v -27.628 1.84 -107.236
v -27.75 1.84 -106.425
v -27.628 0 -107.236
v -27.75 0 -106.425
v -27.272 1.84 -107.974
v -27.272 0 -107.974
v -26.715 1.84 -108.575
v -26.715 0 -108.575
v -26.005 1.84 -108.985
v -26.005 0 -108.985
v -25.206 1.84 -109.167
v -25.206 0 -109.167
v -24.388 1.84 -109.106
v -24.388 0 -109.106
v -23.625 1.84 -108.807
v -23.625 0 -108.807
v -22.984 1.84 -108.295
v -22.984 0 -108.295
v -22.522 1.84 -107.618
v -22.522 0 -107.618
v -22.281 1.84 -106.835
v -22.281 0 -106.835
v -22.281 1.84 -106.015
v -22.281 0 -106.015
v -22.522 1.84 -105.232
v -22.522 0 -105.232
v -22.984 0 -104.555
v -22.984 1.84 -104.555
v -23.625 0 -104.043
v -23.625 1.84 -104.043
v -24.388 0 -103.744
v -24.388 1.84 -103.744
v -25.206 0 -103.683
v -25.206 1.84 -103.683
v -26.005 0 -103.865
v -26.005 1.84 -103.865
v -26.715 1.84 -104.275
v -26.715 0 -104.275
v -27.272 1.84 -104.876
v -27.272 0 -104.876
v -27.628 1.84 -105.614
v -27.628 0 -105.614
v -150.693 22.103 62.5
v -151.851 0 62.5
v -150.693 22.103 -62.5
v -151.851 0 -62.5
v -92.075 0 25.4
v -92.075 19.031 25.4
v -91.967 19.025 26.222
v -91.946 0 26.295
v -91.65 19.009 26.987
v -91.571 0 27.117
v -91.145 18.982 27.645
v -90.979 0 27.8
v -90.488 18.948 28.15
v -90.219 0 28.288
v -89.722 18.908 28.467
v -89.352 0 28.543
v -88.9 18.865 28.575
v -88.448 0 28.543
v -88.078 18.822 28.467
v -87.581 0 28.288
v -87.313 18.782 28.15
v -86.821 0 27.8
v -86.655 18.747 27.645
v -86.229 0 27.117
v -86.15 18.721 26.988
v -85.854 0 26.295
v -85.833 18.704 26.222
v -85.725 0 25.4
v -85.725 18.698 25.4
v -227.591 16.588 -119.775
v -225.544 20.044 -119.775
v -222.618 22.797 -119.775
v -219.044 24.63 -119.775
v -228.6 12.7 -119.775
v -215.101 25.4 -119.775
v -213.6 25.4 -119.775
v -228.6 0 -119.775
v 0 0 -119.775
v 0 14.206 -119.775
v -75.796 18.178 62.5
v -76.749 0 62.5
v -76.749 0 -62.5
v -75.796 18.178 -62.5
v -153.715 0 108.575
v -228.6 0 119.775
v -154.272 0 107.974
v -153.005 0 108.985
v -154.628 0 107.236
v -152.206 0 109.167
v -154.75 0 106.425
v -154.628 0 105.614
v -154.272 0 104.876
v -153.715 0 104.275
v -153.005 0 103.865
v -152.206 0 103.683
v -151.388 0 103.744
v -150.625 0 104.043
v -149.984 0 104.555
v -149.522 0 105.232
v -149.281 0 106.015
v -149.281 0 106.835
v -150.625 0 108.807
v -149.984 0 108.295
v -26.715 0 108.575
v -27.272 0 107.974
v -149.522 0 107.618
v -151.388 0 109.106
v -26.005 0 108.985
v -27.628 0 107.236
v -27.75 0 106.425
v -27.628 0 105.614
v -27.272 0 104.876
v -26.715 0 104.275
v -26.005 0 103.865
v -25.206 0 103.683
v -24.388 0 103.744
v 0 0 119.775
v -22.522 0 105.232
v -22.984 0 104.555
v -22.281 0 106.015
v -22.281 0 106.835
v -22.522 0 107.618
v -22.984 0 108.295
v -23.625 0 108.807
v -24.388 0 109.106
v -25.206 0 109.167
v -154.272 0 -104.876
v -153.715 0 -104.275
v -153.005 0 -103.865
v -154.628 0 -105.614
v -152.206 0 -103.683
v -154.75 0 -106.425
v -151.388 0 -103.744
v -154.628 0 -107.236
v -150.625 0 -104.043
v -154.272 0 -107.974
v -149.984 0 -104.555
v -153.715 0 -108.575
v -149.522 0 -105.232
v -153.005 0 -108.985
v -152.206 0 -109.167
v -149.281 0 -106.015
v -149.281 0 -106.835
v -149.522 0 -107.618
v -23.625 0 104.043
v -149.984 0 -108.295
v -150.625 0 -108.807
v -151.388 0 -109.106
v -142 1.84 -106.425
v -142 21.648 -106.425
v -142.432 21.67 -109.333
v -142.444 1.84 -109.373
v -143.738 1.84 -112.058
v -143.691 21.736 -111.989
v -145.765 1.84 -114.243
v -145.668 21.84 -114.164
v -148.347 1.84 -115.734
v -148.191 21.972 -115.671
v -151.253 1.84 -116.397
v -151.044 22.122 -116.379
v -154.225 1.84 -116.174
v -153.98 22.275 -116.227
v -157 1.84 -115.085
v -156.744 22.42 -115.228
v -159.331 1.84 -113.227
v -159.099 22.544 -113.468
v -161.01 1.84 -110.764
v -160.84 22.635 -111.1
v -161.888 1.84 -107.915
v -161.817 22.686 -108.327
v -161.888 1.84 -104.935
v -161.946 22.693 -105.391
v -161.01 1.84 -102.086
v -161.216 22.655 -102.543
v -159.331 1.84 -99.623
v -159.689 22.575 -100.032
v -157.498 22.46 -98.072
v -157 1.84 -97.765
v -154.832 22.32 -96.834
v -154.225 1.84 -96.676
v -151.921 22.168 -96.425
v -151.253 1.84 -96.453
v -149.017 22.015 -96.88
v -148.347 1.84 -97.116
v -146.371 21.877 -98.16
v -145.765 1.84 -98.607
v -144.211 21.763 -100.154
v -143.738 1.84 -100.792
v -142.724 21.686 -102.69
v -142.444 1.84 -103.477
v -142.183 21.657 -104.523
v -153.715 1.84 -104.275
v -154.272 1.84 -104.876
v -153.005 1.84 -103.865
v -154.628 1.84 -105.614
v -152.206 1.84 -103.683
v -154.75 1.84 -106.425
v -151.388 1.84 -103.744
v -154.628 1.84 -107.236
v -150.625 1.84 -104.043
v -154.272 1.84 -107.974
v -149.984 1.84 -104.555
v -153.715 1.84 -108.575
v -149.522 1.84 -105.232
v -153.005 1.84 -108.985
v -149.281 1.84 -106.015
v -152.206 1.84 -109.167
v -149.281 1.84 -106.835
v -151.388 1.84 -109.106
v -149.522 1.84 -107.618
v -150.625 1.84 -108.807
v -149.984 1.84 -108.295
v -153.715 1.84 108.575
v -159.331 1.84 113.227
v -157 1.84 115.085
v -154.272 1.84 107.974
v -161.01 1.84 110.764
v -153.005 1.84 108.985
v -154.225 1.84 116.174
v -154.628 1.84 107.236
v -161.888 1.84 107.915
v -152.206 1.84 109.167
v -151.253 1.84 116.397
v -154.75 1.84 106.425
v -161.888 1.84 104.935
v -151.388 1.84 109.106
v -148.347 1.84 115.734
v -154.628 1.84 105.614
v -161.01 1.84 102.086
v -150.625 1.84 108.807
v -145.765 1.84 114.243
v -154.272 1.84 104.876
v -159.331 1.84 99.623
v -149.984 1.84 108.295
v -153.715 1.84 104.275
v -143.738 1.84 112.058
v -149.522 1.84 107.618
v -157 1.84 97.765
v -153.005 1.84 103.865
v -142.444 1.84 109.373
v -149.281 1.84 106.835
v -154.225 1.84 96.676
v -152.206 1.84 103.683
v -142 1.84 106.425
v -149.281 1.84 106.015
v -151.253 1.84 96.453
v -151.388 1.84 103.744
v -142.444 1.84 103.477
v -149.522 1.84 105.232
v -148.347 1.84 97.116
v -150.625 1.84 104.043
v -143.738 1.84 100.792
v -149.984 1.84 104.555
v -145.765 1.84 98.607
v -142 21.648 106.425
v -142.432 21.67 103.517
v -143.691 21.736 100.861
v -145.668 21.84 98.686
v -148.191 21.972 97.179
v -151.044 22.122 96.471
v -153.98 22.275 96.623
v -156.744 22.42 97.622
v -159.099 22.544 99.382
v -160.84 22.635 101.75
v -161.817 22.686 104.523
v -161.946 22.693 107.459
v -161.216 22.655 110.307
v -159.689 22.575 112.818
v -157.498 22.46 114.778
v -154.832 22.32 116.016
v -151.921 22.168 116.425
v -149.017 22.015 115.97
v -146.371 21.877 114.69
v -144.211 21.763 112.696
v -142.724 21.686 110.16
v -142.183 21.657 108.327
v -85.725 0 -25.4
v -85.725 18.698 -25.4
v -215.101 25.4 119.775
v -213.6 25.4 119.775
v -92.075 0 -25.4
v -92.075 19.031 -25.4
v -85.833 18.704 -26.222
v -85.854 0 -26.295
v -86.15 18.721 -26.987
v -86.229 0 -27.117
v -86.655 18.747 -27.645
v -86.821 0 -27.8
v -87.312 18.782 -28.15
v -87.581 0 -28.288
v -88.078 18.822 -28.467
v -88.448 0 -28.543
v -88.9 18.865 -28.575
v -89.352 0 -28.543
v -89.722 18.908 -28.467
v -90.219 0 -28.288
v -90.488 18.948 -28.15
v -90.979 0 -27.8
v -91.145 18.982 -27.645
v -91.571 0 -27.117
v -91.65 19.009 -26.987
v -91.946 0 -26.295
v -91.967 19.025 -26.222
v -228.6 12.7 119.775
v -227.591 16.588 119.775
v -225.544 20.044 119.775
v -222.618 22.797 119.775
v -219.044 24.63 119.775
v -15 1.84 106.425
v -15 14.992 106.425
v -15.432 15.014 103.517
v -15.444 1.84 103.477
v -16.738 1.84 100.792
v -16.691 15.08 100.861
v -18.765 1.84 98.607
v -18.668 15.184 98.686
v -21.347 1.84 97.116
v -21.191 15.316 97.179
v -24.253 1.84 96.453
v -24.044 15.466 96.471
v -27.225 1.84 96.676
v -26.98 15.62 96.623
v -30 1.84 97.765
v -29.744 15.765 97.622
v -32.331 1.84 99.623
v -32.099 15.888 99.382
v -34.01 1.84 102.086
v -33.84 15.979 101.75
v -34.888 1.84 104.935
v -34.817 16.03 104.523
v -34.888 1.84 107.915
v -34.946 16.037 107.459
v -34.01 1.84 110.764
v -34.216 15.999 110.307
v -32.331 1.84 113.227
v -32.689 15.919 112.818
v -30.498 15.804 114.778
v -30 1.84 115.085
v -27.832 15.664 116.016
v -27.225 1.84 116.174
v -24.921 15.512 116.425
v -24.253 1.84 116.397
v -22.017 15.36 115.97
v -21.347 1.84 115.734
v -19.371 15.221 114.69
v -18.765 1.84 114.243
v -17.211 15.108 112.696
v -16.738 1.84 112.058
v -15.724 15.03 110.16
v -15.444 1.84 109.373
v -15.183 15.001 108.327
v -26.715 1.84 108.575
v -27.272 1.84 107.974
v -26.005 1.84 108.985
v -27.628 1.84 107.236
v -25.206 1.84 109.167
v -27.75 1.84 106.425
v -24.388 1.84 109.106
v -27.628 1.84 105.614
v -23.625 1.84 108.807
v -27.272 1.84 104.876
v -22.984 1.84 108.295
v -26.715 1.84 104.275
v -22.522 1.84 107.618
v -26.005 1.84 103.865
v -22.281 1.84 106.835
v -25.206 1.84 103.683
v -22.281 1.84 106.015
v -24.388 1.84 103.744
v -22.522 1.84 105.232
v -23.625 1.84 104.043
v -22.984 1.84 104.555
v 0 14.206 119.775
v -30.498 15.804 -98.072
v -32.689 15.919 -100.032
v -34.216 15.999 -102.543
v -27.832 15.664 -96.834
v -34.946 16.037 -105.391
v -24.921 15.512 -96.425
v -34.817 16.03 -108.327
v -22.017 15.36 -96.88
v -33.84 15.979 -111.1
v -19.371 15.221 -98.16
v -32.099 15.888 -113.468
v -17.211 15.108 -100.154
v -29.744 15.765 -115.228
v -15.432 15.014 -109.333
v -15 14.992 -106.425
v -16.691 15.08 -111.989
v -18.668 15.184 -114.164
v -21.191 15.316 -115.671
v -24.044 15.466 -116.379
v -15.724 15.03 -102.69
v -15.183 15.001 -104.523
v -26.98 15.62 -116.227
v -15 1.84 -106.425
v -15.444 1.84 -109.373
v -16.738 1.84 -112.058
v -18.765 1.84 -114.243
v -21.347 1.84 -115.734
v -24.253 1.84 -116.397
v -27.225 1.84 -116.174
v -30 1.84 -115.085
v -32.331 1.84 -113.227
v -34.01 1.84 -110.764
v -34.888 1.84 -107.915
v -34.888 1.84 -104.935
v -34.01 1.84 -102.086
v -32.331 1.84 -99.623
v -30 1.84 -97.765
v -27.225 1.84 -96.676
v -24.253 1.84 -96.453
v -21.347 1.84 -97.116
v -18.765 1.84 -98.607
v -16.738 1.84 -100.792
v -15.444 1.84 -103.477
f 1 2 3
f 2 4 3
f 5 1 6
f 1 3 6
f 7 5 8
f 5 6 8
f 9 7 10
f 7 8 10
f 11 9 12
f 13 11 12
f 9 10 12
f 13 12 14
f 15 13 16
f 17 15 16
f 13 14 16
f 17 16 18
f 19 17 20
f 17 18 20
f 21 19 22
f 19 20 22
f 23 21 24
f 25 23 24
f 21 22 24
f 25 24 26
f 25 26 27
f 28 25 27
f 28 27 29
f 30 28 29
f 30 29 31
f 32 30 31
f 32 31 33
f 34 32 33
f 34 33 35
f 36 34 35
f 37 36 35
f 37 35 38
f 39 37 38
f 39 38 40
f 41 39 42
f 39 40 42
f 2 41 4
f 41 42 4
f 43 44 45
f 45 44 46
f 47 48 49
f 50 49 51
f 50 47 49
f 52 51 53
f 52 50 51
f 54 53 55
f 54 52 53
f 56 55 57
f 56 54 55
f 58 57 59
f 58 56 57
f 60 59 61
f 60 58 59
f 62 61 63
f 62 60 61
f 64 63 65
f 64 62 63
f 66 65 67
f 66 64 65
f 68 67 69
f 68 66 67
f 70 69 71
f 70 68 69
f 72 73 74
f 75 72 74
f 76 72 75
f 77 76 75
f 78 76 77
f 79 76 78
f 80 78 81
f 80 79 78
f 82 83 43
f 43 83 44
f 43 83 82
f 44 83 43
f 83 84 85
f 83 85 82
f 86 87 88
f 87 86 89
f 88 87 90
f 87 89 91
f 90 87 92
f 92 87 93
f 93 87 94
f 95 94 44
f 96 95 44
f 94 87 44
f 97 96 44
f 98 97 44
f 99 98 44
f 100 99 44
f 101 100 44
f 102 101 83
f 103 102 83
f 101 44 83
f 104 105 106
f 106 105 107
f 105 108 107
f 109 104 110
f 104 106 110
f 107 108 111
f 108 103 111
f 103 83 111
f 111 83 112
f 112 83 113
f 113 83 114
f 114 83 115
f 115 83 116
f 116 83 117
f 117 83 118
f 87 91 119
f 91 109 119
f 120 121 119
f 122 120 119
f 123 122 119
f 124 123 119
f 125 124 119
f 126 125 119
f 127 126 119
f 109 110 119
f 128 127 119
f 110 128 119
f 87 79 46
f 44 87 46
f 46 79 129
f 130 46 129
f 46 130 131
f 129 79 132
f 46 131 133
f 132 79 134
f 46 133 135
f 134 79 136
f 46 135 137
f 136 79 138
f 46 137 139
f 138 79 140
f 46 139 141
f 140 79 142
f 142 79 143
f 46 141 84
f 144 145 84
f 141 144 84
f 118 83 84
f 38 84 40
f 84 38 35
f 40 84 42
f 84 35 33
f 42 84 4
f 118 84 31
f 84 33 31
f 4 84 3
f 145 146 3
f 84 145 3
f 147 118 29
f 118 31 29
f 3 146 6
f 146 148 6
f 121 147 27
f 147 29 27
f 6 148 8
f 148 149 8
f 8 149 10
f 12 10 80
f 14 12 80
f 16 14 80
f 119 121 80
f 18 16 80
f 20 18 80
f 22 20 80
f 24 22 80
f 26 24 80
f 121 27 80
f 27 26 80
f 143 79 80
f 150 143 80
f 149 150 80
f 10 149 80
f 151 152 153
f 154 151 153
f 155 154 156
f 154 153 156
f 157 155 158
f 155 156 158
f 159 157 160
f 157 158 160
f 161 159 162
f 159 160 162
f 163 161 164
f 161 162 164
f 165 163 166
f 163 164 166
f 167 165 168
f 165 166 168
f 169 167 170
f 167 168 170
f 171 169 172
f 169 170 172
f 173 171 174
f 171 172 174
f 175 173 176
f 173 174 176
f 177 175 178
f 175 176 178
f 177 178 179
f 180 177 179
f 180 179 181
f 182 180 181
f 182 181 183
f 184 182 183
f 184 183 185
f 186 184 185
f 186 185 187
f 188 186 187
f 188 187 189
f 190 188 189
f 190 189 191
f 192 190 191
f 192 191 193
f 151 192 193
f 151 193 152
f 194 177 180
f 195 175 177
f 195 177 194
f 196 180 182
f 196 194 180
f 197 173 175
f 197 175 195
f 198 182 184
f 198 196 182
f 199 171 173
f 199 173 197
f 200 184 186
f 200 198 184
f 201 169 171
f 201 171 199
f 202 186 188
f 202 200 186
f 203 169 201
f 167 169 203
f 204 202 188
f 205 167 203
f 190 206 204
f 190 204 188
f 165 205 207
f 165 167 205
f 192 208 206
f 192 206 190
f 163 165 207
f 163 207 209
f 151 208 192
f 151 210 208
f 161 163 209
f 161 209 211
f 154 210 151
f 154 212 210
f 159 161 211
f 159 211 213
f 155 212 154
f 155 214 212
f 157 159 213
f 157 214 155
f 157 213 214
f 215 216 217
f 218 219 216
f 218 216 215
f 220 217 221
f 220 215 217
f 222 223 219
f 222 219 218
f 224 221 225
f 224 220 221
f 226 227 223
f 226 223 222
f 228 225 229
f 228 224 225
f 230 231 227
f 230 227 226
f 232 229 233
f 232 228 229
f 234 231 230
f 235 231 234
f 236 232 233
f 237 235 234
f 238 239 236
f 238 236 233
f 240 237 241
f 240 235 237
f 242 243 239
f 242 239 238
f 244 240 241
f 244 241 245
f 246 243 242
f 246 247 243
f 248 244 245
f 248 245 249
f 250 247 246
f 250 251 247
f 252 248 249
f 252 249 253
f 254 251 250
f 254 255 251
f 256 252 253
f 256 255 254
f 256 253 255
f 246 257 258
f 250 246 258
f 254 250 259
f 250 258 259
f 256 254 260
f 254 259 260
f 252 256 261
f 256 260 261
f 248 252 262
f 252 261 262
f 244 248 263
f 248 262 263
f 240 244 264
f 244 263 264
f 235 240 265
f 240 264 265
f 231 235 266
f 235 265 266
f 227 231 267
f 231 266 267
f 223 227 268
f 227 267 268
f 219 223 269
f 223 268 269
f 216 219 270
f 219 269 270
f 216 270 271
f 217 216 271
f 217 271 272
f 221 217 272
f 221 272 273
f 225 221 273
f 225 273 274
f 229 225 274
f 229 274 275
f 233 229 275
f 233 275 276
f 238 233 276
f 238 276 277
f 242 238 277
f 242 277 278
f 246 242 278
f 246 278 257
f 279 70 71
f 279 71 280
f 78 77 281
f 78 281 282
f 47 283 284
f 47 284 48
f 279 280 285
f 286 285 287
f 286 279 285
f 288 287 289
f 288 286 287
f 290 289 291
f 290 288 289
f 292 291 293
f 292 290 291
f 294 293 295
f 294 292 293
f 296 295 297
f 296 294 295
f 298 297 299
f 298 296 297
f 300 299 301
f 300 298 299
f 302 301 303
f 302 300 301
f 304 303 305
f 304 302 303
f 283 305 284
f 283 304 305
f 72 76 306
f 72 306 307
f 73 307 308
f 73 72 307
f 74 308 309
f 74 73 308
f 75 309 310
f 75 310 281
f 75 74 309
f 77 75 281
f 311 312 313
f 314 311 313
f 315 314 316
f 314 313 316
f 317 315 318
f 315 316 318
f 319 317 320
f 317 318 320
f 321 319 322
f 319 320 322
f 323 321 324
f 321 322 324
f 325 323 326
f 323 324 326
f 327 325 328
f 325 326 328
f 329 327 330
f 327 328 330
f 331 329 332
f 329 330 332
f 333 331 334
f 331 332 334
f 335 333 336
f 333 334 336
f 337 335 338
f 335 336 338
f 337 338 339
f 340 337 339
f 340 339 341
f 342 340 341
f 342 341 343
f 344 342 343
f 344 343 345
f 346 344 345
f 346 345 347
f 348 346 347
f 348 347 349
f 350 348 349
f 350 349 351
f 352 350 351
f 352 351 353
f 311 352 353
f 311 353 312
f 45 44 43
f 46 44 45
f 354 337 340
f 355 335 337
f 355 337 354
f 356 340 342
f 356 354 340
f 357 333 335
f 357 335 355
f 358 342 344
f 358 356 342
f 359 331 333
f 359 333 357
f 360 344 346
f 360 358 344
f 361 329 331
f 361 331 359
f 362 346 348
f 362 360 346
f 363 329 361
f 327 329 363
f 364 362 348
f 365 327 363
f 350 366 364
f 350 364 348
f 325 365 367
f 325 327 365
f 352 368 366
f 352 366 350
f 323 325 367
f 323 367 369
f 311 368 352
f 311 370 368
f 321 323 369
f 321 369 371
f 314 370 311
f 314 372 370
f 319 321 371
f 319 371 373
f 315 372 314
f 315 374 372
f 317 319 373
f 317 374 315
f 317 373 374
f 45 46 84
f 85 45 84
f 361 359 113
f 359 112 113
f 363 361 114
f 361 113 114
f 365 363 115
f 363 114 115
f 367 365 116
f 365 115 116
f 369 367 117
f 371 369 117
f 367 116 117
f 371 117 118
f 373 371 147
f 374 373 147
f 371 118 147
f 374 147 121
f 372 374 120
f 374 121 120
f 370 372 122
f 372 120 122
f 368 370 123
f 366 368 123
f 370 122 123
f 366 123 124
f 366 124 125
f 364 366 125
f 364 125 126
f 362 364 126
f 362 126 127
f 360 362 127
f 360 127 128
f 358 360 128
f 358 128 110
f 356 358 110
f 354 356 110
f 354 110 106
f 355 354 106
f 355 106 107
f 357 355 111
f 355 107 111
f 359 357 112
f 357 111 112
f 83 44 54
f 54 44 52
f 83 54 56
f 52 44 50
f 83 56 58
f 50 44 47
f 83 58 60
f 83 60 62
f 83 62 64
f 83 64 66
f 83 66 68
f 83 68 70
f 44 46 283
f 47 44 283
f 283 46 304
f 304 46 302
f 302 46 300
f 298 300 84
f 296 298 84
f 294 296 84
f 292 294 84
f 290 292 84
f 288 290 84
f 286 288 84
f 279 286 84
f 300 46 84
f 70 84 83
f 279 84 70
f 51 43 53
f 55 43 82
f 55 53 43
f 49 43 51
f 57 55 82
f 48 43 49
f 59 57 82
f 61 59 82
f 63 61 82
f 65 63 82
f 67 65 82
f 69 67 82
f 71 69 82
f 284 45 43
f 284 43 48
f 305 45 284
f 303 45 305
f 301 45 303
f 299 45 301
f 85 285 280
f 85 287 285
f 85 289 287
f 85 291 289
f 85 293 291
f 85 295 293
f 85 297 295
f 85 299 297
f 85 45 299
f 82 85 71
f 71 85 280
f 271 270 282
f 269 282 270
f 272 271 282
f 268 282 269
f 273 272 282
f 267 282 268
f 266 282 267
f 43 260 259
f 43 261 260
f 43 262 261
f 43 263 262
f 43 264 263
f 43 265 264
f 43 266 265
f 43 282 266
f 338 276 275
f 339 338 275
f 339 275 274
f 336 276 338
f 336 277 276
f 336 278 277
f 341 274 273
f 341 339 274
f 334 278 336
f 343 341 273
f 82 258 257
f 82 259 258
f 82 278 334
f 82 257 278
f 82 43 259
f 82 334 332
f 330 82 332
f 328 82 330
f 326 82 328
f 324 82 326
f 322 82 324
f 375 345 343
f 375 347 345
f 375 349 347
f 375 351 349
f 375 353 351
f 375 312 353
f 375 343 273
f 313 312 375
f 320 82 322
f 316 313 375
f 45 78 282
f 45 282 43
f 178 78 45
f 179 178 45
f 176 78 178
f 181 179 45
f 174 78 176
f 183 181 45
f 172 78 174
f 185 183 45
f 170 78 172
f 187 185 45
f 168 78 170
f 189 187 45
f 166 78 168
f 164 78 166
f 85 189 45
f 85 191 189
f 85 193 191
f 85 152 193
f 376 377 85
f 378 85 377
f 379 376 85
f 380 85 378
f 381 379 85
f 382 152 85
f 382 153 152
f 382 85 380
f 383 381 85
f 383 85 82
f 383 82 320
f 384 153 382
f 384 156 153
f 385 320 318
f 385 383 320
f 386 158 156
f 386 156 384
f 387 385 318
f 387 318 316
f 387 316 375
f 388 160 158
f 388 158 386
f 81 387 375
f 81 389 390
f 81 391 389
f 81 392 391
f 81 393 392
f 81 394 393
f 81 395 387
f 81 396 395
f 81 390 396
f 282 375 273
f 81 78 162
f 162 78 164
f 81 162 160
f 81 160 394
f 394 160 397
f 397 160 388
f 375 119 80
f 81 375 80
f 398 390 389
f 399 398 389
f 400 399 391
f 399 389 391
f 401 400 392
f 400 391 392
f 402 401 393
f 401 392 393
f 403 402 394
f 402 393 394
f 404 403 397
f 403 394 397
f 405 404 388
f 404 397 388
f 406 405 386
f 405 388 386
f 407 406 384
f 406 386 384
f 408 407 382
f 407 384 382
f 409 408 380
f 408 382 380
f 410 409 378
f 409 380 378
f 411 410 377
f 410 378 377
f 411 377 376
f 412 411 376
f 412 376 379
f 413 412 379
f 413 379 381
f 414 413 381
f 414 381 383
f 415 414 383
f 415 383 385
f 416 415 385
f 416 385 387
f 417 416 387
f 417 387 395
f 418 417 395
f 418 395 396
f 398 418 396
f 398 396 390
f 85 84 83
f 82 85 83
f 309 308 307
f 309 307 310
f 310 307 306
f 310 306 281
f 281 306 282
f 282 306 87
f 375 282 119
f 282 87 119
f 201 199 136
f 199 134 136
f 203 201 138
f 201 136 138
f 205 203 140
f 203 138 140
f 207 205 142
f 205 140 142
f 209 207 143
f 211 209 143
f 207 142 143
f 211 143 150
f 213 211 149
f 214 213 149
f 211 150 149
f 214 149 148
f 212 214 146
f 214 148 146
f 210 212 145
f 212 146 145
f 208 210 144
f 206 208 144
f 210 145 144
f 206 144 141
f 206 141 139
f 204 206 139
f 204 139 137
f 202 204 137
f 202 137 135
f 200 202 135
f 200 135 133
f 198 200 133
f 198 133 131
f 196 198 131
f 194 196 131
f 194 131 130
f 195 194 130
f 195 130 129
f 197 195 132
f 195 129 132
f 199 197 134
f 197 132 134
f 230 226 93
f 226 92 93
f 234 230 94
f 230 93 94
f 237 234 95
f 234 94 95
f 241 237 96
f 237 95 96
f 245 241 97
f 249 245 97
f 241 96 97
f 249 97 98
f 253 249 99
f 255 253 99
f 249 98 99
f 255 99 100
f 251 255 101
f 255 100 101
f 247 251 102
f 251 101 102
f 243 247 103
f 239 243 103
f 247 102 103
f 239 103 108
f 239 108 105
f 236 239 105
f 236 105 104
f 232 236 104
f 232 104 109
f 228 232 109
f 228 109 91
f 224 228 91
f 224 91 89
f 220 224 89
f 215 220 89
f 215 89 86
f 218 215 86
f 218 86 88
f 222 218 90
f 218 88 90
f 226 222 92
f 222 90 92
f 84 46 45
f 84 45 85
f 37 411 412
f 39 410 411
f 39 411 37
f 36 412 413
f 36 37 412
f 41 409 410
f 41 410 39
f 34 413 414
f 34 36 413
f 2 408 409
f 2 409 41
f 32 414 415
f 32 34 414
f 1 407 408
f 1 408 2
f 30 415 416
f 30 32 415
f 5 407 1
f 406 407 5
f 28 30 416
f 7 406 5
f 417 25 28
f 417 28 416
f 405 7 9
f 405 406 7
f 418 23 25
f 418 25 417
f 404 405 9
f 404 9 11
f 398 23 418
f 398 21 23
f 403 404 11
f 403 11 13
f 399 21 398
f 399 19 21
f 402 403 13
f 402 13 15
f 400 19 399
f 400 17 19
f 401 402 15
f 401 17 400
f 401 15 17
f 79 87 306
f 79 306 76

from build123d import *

# Parameters (mm, degrees)
SKETCH1_W                               = 228.6
SKETCH1_H                               = 239.55
BOSS_EXTRUDE1_DEPTH                     = 25.4
CUT_EXTRUDE1_START                      = -119.775
CUT_EXTRUDE1_DEPTH                      = 239.55
CBORE_FOR_M5_HEX_HEAD_BOLT1_D           = 5.5
CBORE_FOR_M5_HEX_HEAD_BOLT1_CBORE_D     = 20
CBORE_FOR_M5_HEX_HEAD_BOLT1_CBORE_DEPTH = 23.58
SPLIT1_SURFACE_1_BACK                   = 333.095
SPLIT1_SURFACE_1_DEPTH                  = 666.19
SPLIT1_SURFACE_2_BACK                   = 333.095
SPLIT1_SURFACE_2_DEPTH                  = 666.19
CUT_EXTRUDE2_DEPTH                      = 260.324450496
CUT_EXTRUDE2_DEPTH_BACK                 = 260.324450496


# Read off the part's stored shape, not the designer's step: Cut-Extrude1
with BuildPart() as part:
    # Sketch1 → Boss-Extrude1 (new body)
    with BuildSketch(Plane(origin=(0, 0, 0), x_dir=(1, 0, 0), z_dir=(0, 1, 0))):
        with Locations((-114.3, 0)):
            Rectangle(SKETCH1_W, SKETCH1_H)
    extrude(amount=BOSS_EXTRUDE1_DEPTH)

    # Cut-Extrude1 outline → Cut-Extrude1 (cut)
    with BuildSketch(Plane.XY.offset(CUT_EXTRUDE1_START)):
        with BuildLine():
            ThreePointArc((-228.6, 12.7), (-224.177702735, 21.523512133), (-215.101143845, 25.4))
            Line((-215.101143845, 25.4), (-228.6, 25.4))
            Line((-228.6, 25.4), (-228.6, 12.7))
        make_face()
        Polygon((0, 25.4), (-213.6, 25.4), (0, 14.205698345), align=None)
    extrude(amount=CUT_EXTRUDE1_DEPTH, mode=Mode.SUBTRACT)

    # CBORE for M5 Hex Head Bolt1 (through all)
    with Locations(Plane(origin=(0, 25.419654417, 0), x_dir=(1, 0, 0), z_dir=(0, 1, 0))):
        with Locations((-152, 106.425), (-25, 106.425), (-25, -106.425), (-152, -106.425)):
            CounterBoreHole(CBORE_FOR_M5_HEX_HEAD_BOLT1_D / 2, CBORE_FOR_M5_HEX_HEAD_BOLT1_CBORE_D / 2, CBORE_FOR_M5_HEX_HEAD_BOLT1_CBORE_DEPTH)


with BuildPart() as body_2:
    # Split1: the piece behind the surface
    add(part.part)
    # Split1 surface: a surface, the sketch's curves swept straight by 666.19 mm
    with BuildLine(Plane(origin=(0.742449909, 14.166788194, 0), x_dir=(0.9986295347545743, -0.05233595624293694, 0), z_dir=(0.052335956242936944, 0.9986295347545744, 0)).offset(-SPLIT1_SURFACE_1_BACK), mode=Mode.PRIVATE) as split1_surface_1_path:
        Line((-76.643355822, -62.5), (-151.643355822, -62.5))
        Line((-151.643355822, -62.5), (-151.643355822, 62.5))
        Line((-151.643355822, 62.5), (-76.643355822, 62.5))
        Line((-76.643355822, 62.5), (-76.643355822, -62.5))
    split1_surface_1 = Shell.extrude(split1_surface_1_path.wire(), (0.052335956 * SPLIT1_SURFACE_1_DEPTH, 0.998629535 * SPLIT1_SURFACE_1_DEPTH, 0 * SPLIT1_SURFACE_1_DEPTH))
    split(bisect_by=split1_surface_1, keep=Keep.BOTTOM)

    # Sketch12 → Cut-Extrude2 (cut, two sides: drawn at the far end of the back side and taken through both)
    with BuildSketch(Plane(origin=(0, 0, 0), x_dir=(1, 0, 0), z_dir=(0, 1, 0)).offset(-CUT_EXTRUDE2_DEPTH_BACK)):
        with BuildLine():
            Line((-92.075, 25.4), (-92.075, -25.4))
            ThreePointArc((-92.075, -25.4), (-88.9, -28.575), (-85.725, -25.4))
            Line((-85.725, -25.4), (-85.725, 25.4))
            ThreePointArc((-85.725, 25.4), (-88.9, 28.575), (-92.075, 25.4))
        make_face()
    extrude(amount=CUT_EXTRUDE2_DEPTH + CUT_EXTRUDE2_DEPTH_BACK, mode=Mode.SUBTRACT)


with BuildPart() as part_1:
    add(part.part)

    # Split1: split by a surface, the side it looks to stays
    # Split1 surface: a surface, the sketch's curves swept straight by 666.19 mm
    with BuildLine(Plane(origin=(0.742449909, 14.166788194, 0), x_dir=(0.9986295347545743, -0.05233595624293694, 0), z_dir=(0.052335956242936944, 0.9986295347545744, 0)).offset(-SPLIT1_SURFACE_2_BACK), mode=Mode.PRIVATE) as split1_surface_2_path:
        Line((-76.643355822, -62.5), (-151.643355822, -62.5))
        Line((-151.643355822, -62.5), (-151.643355822, 62.5))
        Line((-151.643355822, 62.5), (-76.643355822, 62.5))
        Line((-76.643355822, 62.5), (-76.643355822, -62.5))
    split1_surface_2 = Shell.extrude(split1_surface_2_path.wire(), (0.052335956 * SPLIT1_SURFACE_2_DEPTH, 0.998629535 * SPLIT1_SURFACE_2_DEPTH, 0 * SPLIT1_SURFACE_2_DEPTH))
    split(bisect_by=split1_surface_2, keep=Keep.TOP)


solid = Compound([body_2.part, part_1.part])
